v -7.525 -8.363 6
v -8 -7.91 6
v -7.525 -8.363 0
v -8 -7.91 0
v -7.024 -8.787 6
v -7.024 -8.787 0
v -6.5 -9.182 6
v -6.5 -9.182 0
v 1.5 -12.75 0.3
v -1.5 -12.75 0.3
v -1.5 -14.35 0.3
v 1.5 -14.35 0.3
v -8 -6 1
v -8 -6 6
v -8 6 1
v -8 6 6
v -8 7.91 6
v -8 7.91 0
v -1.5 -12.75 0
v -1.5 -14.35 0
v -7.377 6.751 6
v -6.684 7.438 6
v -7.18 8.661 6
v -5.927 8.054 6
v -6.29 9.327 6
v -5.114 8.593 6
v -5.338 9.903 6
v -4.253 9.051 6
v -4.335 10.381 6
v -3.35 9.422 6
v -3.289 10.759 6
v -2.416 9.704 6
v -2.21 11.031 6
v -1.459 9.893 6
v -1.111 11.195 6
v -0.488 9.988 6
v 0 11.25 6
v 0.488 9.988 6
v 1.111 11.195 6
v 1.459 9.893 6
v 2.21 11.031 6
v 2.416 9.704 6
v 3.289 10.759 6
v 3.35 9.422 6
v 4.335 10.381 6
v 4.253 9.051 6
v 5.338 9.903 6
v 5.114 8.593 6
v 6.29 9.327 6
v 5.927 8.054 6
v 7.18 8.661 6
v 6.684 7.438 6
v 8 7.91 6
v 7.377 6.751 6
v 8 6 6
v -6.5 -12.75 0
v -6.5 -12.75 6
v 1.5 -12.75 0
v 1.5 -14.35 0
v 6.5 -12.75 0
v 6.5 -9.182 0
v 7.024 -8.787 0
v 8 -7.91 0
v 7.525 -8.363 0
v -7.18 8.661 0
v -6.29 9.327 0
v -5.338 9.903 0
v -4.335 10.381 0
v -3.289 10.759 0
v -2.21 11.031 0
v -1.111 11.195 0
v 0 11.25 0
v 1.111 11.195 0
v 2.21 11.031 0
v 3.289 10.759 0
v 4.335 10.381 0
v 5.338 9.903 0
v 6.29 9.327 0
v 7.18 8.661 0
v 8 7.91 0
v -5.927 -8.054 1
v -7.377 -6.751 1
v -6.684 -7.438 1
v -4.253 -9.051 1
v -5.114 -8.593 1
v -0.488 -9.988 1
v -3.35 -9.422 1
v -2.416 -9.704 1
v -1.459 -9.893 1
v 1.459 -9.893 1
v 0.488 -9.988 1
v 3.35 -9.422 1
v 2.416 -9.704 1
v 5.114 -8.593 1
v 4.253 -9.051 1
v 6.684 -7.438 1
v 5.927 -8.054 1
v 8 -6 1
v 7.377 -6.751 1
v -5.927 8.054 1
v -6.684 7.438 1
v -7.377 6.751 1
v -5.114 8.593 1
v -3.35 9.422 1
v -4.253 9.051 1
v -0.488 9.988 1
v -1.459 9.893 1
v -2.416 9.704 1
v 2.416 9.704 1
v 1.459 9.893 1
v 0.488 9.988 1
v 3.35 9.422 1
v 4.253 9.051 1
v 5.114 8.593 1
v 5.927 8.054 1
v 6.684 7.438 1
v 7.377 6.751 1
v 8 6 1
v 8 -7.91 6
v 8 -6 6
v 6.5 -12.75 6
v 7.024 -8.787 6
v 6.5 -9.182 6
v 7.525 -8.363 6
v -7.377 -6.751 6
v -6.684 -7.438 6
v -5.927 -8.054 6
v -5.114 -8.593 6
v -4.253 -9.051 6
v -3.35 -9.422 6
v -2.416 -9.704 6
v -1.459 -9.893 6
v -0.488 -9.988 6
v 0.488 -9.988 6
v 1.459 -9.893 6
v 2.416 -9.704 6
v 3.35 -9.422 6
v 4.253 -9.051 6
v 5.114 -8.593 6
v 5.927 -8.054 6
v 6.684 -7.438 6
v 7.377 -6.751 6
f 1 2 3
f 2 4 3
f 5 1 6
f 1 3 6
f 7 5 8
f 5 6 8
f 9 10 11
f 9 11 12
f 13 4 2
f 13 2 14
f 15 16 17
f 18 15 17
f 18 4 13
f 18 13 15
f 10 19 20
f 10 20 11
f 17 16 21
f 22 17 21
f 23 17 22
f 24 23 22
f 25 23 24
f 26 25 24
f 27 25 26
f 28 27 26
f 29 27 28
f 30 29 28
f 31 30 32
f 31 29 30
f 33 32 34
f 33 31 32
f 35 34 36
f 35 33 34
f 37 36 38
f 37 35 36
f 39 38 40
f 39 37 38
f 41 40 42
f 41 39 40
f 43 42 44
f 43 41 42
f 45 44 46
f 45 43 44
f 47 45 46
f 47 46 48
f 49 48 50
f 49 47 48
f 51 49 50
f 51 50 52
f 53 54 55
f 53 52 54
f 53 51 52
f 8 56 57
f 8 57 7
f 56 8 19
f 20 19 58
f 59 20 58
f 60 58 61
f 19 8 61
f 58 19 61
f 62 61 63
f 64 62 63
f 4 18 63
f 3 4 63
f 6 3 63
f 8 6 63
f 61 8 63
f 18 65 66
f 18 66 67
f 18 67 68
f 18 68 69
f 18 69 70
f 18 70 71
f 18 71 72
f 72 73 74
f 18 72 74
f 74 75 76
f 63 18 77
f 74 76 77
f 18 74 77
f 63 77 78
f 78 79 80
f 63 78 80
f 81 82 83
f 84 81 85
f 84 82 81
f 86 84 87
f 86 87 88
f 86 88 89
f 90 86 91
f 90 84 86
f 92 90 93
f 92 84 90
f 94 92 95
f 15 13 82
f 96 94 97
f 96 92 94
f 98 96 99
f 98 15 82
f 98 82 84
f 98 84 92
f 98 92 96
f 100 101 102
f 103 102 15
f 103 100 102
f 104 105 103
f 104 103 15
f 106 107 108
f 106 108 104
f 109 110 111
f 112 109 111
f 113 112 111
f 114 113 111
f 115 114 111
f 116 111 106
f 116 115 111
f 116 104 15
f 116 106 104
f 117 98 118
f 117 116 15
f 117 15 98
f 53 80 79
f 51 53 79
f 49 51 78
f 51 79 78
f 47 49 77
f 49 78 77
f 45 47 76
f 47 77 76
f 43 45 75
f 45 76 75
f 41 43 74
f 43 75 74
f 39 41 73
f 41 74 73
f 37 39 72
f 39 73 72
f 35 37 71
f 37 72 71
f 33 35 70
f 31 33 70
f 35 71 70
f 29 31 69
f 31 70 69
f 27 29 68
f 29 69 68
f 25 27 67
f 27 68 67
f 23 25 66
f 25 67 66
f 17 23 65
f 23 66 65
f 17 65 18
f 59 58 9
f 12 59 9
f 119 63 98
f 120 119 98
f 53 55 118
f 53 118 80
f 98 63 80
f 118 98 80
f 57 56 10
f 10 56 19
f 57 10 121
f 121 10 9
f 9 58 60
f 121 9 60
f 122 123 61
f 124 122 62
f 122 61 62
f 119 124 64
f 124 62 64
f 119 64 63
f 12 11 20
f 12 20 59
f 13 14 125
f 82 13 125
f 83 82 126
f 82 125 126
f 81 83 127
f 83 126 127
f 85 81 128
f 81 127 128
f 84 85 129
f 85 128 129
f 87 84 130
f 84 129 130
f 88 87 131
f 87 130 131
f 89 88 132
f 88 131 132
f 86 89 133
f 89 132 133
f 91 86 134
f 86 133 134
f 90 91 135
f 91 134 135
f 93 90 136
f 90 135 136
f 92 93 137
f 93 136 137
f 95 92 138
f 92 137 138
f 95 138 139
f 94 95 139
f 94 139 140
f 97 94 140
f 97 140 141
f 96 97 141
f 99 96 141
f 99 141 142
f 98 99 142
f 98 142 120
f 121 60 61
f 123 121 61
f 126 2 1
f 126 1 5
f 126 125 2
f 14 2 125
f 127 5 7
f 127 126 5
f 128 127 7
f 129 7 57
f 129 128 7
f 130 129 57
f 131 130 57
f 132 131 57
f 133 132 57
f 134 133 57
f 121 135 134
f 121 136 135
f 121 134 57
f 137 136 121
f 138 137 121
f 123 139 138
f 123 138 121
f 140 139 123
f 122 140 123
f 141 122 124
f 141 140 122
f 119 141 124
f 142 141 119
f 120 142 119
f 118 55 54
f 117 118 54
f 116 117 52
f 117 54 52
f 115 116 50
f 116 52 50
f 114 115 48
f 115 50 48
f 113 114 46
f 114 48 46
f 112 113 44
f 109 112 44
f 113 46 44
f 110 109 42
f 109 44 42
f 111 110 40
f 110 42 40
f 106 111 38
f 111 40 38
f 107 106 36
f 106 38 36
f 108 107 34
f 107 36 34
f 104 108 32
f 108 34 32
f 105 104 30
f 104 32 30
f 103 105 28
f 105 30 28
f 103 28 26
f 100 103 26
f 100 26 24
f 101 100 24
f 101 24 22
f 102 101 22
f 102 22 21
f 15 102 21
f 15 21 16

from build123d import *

# Parameters (mm, degrees)
SKETCH1_R           = 11.25
BOSS_EXTRUDE1_DEPTH = 6
SKETCH4_W           = 36
SKETCH4_H           = 45
SKETCH4_W_2         = 16
SKETCH4_H_2         = 25
CUT_EXTRUDE3_DEPTH  = 18.003676073
SKETCH5_W           = 13
SKETCH5_H           = 17
BOSS_EXTRUDE2_DEPTH = 6
SKETCH2_R           = 10
CUT_EXTRUDE4_DEPTH  = 5
SKETCH6_W           = 3
SKETCH6_H           = 0.3
BOSS_EXTRUDE3_DEPTH = 1.6


with BuildPart() as part:
    # Sketch1 → Boss-Extrude1 (new body)
    with BuildSketch(Plane.XY):
        Circle(SKETCH1_R)
    extrude(amount=BOSS_EXTRUDE1_DEPTH)

    # Sketch4 → Cut-Extrude3 (cut, through all)
    with BuildSketch(Plane.XY):
        Rectangle(SKETCH4_W, SKETCH4_H)
        Rectangle(SKETCH4_W_2, SKETCH4_H_2, mode=Mode.SUBTRACT)
    extrude(amount=CUT_EXTRUDE3_DEPTH, mode=Mode.SUBTRACT)

    # Sketch5 → Boss-Extrude2 (add)
    with BuildSketch(Plane.XY):
        with Locations((0, -4.25)):
            Rectangle(SKETCH5_W, SKETCH5_H)
    extrude(amount=BOSS_EXTRUDE2_DEPTH)

    # Sketch2 → Cut-Extrude4 (cut)
    with BuildSketch(Plane.XY.offset(6)):
        Circle(SKETCH2_R)
    extrude(amount=-CUT_EXTRUDE4_DEPTH, mode=Mode.SUBTRACT)

    # Sketch6 → Boss-Extrude3 (add)
    with BuildSketch(Plane.XZ.offset(12.75)):
        with Locations((0, 0.15)):
            Rectangle(SKETCH6_W, SKETCH6_H)
    extrude(amount=BOSS_EXTRUDE3_DEPTH)


solid = part.part
